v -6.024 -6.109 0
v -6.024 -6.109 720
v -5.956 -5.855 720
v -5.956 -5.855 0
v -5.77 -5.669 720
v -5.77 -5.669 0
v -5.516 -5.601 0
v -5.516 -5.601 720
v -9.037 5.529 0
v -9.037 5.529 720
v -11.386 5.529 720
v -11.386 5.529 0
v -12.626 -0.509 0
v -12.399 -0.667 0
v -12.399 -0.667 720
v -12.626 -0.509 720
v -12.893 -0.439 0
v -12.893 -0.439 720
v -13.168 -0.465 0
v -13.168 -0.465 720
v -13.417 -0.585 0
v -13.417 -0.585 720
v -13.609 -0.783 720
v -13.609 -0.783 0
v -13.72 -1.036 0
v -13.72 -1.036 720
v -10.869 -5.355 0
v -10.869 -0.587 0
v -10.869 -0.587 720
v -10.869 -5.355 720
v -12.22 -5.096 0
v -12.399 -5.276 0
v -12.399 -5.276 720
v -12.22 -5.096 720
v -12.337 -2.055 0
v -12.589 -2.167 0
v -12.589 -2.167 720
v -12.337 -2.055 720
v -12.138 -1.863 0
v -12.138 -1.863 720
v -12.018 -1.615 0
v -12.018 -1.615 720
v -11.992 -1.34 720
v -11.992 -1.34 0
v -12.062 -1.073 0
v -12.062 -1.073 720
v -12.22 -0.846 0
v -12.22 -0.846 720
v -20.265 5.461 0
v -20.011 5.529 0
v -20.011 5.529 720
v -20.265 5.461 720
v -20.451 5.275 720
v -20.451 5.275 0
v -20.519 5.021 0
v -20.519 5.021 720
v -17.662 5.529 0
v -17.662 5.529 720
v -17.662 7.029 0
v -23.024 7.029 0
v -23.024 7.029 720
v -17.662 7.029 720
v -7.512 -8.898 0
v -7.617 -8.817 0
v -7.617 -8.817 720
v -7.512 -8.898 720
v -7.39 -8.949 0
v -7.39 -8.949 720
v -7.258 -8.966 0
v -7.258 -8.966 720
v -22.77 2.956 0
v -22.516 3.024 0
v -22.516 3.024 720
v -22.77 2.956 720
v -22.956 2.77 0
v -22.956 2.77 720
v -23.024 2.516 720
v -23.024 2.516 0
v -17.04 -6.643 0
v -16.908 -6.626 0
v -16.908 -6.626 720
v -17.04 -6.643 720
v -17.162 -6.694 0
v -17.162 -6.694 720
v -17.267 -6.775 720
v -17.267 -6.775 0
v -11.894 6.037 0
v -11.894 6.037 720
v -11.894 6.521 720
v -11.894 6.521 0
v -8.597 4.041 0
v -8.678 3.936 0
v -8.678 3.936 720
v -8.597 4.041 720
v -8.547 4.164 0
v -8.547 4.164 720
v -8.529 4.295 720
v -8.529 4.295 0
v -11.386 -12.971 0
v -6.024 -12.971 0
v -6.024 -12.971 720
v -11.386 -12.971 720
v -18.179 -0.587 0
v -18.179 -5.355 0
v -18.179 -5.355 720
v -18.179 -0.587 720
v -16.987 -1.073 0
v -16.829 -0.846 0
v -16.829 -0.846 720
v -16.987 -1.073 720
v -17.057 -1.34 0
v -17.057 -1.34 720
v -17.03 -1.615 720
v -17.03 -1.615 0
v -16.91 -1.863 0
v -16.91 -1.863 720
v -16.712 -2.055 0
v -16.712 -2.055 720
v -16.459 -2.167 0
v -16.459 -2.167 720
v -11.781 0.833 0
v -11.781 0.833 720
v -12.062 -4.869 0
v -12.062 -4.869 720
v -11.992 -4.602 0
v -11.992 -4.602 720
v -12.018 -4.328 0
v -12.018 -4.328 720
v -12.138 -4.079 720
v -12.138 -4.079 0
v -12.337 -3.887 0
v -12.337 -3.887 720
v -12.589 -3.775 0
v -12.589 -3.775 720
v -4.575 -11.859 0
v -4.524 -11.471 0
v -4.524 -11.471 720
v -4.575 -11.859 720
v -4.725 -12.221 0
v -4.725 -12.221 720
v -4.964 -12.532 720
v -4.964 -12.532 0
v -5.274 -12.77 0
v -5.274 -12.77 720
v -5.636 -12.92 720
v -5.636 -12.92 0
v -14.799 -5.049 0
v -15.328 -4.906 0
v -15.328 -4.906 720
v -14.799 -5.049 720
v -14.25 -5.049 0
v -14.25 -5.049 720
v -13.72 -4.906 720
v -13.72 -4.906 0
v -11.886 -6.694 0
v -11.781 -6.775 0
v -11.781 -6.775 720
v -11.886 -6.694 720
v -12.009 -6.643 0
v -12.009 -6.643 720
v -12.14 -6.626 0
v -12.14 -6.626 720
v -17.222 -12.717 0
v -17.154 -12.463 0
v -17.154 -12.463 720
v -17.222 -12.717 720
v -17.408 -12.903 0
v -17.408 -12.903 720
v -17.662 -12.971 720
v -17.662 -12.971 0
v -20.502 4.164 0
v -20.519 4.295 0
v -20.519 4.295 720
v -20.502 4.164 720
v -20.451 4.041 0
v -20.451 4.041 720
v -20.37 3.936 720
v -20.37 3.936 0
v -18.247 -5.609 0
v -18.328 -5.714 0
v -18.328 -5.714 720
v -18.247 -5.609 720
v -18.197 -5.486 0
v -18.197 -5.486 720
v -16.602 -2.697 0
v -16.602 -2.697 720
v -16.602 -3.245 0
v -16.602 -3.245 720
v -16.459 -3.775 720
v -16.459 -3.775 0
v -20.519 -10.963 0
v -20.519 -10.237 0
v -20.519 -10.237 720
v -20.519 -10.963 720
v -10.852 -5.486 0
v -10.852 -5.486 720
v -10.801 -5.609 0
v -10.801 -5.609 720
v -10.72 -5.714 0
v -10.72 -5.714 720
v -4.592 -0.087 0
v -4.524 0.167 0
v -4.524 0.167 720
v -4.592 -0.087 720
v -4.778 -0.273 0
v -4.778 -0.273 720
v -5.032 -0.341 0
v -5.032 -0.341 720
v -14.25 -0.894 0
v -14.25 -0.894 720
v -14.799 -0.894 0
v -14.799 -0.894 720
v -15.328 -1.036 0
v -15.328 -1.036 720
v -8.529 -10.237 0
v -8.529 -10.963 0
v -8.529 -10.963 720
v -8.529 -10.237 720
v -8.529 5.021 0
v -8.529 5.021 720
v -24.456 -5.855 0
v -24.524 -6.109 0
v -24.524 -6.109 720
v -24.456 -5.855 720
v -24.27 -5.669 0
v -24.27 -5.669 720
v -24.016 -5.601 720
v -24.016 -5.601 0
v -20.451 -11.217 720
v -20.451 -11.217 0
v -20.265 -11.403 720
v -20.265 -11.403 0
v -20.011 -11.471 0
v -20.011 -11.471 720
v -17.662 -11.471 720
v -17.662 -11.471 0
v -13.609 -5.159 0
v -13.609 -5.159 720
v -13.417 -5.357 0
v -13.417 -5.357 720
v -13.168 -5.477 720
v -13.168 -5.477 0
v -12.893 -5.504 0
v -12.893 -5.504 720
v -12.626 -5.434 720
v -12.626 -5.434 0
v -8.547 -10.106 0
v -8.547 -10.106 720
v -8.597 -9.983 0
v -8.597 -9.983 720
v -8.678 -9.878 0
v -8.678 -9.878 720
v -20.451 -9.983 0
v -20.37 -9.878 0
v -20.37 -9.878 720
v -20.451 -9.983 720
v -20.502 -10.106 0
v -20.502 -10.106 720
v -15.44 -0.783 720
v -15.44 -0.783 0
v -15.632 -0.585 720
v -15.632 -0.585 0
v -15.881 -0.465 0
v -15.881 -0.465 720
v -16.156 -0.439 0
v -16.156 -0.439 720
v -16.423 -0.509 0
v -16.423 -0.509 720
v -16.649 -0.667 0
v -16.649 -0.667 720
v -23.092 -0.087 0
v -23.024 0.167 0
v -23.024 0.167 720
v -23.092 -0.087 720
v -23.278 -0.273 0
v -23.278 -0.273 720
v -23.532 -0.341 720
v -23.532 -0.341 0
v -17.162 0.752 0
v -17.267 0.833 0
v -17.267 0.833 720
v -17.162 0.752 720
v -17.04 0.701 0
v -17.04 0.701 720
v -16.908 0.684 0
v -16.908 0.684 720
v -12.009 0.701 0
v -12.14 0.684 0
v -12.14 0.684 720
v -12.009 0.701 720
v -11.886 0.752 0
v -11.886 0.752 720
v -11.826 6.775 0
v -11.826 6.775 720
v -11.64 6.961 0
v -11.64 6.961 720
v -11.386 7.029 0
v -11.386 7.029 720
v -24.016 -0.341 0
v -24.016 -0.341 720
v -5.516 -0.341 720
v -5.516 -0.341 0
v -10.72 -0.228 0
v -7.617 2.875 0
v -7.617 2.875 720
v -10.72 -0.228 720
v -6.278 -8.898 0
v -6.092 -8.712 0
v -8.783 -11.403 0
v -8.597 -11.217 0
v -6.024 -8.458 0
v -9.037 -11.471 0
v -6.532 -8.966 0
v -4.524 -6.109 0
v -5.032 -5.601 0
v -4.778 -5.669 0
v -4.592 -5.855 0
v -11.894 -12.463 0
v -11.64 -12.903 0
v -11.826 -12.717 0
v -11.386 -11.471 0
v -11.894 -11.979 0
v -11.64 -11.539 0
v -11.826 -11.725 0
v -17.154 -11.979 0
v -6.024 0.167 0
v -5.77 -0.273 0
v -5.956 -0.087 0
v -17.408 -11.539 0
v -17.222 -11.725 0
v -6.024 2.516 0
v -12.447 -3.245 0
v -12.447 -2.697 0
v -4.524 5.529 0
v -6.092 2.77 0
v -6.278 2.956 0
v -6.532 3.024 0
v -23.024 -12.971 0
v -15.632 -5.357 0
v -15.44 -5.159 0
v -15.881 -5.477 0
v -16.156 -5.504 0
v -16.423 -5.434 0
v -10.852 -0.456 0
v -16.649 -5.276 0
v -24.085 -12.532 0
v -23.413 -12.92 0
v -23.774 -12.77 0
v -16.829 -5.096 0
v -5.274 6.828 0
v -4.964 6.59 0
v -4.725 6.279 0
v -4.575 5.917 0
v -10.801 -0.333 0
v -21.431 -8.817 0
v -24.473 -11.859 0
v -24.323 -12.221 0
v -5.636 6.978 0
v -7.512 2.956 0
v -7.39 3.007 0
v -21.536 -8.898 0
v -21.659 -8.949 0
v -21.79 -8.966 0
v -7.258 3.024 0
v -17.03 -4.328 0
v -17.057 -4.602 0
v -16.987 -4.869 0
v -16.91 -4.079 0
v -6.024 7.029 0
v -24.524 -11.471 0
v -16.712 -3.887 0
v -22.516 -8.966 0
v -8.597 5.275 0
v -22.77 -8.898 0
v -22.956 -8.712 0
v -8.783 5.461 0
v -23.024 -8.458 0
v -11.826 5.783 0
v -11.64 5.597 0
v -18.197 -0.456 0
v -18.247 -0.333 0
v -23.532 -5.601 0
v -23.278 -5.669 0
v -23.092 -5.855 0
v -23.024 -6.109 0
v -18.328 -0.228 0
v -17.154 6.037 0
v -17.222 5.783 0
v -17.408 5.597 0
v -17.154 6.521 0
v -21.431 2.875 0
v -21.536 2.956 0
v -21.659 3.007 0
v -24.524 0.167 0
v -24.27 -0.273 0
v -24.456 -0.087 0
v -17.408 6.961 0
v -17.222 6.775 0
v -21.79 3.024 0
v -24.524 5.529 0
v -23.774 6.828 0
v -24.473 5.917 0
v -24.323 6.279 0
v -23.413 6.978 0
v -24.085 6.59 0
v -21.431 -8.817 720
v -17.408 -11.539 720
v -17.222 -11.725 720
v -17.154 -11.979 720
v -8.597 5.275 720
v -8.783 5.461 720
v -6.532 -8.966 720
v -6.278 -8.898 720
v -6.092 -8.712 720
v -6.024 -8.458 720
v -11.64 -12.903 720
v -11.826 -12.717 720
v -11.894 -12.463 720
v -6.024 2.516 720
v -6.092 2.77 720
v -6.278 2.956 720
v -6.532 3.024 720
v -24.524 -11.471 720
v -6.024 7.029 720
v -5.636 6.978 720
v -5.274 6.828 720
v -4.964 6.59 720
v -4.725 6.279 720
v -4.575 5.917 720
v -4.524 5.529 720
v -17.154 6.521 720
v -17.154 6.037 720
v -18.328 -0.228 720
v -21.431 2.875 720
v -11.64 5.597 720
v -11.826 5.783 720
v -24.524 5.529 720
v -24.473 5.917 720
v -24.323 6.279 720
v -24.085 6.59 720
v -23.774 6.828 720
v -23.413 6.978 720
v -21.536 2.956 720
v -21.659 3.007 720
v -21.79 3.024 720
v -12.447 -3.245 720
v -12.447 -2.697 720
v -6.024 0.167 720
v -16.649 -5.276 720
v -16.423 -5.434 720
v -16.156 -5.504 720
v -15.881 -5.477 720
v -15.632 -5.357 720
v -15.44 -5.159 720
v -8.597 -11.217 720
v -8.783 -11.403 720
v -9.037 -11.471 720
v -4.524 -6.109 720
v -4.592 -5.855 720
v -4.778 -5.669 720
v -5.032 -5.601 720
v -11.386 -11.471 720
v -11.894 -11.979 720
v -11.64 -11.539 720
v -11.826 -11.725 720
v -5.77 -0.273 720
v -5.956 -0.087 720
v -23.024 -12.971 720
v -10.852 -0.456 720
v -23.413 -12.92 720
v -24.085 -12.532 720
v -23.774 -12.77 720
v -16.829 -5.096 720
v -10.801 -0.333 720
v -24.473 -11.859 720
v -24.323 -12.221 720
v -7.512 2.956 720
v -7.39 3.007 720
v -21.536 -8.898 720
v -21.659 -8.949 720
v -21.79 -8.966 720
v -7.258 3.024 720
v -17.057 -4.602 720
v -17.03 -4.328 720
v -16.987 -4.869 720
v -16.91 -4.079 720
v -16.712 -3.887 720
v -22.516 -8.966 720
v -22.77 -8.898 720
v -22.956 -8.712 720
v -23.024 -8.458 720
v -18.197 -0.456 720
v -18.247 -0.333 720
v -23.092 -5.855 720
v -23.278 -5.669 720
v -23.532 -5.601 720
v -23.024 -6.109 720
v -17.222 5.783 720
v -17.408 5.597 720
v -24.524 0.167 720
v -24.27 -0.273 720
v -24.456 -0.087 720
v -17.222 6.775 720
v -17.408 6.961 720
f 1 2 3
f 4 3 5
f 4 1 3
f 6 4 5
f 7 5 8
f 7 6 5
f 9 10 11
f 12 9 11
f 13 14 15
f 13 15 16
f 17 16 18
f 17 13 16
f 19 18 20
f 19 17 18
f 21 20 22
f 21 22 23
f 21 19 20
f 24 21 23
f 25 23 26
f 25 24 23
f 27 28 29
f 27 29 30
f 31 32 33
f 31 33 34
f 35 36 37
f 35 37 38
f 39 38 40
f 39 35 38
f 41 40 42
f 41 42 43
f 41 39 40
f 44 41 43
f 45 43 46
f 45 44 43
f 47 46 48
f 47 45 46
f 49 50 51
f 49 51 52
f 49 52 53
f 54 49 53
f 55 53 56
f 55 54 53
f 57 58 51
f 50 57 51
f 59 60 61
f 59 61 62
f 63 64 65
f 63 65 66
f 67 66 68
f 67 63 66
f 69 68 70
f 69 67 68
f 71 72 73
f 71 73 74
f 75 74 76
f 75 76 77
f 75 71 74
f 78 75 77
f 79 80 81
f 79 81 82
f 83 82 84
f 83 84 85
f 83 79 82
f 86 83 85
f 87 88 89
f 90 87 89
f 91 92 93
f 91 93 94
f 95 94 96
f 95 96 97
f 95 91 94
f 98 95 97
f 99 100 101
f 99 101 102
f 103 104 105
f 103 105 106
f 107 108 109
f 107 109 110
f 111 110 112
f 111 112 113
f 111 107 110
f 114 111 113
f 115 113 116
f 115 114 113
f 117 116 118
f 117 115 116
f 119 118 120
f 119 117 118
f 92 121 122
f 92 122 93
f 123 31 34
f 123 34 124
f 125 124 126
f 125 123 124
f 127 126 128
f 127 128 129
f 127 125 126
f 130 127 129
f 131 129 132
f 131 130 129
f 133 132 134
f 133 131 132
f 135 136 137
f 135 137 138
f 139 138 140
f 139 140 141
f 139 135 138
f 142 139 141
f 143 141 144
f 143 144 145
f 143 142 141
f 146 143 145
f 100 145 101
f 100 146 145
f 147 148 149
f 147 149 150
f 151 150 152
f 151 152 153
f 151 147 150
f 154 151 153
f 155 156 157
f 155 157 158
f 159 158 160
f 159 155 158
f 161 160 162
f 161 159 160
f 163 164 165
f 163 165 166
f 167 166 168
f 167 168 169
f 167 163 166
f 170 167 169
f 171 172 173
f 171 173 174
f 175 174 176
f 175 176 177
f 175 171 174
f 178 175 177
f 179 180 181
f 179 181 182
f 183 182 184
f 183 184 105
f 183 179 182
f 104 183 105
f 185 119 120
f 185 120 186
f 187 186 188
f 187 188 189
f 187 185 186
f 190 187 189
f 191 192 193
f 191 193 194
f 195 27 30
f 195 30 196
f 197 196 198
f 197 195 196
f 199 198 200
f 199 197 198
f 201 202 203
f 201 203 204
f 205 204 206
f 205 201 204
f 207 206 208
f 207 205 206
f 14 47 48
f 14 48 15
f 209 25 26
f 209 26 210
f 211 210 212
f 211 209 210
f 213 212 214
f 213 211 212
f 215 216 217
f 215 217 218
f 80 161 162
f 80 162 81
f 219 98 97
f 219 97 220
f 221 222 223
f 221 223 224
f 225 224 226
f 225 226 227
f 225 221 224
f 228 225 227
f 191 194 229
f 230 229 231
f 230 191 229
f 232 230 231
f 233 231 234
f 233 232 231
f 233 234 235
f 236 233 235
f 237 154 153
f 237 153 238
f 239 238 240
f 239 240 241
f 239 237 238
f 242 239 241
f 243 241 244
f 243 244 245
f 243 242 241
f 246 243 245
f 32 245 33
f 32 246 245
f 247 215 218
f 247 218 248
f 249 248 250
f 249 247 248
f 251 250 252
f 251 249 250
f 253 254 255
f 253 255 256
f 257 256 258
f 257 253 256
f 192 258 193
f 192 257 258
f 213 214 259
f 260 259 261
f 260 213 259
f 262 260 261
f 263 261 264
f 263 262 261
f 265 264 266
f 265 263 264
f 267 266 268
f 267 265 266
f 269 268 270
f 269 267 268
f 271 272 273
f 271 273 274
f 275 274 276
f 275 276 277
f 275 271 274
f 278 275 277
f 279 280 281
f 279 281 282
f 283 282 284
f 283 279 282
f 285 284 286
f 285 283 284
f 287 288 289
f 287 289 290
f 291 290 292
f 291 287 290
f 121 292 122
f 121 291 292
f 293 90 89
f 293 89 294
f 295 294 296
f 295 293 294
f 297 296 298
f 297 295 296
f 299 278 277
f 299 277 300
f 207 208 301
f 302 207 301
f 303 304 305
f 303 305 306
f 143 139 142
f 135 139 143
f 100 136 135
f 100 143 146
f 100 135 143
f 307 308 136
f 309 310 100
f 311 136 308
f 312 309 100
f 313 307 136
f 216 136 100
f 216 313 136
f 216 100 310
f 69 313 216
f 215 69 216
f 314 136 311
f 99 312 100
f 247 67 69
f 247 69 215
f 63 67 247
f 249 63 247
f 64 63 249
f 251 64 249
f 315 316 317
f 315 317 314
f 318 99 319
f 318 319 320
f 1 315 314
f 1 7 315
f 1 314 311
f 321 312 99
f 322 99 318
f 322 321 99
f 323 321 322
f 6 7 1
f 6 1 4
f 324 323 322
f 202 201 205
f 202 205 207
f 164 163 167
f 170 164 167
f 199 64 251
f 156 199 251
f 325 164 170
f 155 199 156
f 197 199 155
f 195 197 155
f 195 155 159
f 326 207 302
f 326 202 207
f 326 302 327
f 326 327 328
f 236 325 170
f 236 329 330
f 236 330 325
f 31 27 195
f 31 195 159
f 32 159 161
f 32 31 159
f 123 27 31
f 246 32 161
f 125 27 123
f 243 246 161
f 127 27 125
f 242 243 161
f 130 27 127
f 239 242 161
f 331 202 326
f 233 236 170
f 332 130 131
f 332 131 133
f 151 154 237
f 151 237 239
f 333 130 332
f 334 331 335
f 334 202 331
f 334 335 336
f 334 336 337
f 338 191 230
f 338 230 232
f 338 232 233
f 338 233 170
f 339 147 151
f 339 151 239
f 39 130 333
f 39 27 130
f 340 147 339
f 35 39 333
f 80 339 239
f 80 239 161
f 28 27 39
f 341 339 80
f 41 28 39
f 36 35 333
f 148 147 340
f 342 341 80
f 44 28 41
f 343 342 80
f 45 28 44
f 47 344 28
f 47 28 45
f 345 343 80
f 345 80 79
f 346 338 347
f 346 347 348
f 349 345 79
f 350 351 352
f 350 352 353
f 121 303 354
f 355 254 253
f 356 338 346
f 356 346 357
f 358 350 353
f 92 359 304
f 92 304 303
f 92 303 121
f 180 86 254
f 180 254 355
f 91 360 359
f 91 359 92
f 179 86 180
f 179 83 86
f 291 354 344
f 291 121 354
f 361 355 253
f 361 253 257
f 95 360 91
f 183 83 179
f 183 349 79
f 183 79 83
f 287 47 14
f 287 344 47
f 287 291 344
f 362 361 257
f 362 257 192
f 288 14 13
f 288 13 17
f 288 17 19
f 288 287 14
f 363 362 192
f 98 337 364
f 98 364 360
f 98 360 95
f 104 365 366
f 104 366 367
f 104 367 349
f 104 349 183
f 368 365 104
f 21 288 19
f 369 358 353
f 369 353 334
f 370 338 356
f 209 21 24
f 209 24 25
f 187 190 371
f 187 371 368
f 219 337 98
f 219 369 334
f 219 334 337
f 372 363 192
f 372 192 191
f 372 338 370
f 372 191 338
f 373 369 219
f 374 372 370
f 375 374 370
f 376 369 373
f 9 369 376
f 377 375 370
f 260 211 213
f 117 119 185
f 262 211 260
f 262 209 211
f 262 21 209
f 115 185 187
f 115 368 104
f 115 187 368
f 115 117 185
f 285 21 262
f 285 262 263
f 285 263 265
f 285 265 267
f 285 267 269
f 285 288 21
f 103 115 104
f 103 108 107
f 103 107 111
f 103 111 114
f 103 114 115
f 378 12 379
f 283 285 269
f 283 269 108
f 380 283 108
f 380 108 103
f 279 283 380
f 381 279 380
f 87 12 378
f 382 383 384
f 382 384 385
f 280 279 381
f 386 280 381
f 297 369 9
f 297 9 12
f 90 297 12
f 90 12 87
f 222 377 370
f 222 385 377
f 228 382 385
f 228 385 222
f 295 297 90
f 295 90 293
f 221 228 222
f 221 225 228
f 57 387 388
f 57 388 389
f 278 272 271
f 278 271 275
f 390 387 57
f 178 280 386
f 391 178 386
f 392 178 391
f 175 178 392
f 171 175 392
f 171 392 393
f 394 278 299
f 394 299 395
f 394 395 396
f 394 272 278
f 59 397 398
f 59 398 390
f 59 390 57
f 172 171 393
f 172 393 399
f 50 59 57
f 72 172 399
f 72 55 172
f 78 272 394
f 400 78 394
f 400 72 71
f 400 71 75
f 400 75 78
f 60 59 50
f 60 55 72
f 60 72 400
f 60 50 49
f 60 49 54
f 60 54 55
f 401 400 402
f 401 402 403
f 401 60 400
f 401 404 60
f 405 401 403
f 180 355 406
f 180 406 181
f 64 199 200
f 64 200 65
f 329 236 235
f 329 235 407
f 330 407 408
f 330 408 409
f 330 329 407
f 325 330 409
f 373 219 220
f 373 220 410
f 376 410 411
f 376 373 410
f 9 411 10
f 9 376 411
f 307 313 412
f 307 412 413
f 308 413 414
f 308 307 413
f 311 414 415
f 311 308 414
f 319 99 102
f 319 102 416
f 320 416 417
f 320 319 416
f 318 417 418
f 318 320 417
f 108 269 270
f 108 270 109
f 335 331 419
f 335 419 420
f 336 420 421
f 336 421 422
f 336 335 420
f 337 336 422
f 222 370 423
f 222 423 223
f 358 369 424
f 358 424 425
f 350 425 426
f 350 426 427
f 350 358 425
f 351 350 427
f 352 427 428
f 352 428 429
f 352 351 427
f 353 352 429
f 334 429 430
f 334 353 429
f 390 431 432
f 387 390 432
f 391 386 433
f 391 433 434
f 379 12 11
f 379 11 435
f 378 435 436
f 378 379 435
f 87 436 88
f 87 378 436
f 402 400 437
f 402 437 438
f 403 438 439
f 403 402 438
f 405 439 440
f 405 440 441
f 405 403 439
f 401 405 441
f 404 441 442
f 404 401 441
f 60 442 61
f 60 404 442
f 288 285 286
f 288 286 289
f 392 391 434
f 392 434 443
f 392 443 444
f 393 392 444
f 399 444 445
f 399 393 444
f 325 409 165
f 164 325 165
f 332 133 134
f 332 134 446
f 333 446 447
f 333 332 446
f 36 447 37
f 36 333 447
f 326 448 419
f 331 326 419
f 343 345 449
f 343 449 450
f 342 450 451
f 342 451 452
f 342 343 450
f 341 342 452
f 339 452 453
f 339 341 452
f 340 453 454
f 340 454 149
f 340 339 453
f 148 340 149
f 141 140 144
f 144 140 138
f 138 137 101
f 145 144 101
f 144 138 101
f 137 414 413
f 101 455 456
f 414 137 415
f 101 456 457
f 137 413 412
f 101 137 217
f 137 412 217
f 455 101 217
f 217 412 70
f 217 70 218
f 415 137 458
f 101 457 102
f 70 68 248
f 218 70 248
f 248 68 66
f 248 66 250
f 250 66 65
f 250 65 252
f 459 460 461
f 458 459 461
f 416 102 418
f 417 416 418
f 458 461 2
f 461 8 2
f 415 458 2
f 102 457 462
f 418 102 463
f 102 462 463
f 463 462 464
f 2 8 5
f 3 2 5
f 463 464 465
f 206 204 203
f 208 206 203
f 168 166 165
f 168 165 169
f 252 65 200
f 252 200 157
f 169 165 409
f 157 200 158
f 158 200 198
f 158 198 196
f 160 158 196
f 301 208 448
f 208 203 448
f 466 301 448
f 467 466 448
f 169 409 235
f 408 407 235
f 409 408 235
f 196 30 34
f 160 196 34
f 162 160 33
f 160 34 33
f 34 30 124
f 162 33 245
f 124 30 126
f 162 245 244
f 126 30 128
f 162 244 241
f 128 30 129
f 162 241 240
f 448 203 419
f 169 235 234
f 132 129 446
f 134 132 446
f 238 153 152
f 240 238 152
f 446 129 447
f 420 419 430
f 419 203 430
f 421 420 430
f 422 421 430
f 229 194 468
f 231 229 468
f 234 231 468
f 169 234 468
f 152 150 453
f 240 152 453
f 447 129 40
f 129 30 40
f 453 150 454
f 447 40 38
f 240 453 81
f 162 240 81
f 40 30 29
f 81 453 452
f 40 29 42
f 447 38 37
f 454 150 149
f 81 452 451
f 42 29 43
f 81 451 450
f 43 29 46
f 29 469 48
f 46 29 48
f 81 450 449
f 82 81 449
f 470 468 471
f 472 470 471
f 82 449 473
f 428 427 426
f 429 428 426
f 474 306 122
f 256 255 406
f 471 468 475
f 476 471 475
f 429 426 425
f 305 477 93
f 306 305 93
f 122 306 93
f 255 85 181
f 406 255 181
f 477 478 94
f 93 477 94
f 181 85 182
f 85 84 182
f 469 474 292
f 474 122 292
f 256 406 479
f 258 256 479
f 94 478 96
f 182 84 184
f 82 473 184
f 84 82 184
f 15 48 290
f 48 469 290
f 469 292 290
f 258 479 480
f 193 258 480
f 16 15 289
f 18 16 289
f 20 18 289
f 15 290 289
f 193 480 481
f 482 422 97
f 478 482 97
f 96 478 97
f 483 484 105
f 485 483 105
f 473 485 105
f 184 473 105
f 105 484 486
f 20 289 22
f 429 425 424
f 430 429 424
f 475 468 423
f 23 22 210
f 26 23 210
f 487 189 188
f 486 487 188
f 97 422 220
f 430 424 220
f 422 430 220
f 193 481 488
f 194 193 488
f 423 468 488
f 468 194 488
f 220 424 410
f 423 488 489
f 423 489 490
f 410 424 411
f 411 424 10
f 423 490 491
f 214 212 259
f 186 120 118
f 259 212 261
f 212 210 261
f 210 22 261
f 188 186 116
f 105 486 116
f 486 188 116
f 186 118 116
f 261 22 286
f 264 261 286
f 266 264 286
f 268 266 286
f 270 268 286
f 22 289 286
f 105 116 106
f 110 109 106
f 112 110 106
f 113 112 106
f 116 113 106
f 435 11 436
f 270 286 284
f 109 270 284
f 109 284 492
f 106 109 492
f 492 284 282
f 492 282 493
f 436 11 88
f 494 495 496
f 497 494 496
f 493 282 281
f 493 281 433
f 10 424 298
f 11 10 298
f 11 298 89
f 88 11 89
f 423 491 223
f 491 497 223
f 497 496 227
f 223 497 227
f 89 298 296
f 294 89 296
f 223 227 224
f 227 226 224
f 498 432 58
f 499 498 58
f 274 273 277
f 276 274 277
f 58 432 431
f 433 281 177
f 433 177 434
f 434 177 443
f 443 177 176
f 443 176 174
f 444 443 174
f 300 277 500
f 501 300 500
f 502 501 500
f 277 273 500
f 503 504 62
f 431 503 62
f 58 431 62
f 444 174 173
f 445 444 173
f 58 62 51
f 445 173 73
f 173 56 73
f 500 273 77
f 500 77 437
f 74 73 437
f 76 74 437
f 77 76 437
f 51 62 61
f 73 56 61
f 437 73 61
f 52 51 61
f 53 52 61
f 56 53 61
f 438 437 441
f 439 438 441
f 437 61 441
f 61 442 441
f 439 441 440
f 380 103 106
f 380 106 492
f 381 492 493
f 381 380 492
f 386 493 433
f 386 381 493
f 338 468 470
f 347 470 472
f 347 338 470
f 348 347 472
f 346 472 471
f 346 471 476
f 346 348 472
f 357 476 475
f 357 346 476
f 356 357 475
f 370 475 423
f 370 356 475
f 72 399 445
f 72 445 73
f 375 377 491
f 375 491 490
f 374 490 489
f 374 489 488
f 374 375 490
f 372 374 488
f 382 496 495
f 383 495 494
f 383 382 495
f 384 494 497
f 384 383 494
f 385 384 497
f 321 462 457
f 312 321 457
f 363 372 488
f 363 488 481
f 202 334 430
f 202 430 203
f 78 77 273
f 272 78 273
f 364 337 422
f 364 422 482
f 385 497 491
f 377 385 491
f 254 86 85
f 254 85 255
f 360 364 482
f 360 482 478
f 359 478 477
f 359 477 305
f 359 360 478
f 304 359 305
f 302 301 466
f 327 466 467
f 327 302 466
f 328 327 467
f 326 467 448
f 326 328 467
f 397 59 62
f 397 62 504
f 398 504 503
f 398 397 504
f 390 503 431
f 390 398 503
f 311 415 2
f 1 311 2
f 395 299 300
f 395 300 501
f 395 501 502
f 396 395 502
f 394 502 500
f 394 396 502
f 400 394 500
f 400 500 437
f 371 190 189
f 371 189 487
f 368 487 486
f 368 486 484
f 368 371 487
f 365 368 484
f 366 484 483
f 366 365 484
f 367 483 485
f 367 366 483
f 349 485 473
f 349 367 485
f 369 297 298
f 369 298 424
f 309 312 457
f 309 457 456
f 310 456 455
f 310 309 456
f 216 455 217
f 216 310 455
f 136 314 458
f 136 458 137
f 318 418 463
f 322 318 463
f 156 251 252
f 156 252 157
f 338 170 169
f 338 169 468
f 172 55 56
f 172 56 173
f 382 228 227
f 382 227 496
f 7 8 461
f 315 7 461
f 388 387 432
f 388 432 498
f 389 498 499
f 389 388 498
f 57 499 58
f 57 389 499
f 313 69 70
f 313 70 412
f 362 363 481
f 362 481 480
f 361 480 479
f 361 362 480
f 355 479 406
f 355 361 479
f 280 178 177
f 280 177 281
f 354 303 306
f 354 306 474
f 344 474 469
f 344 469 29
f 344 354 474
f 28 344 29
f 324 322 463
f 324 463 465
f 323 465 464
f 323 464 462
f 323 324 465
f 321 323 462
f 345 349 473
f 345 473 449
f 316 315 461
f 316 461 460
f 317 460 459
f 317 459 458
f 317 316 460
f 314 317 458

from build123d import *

# Parameters (mm, degrees)
EXTRUDE1_DEPTH = 720


with BuildPart() as part:
    # Sketch1 → Extrude1 (new body)
    with BuildSketch(Plane.XY):
        with BuildLine():
            Line((-5.032287798, -0.341059771), (-5.516287798, -0.341059771))
            ThreePointArc((-5.516287798, -0.341059771), (-5.875498042, -0.192270016), (-6.024287798, 0.166940229))
            Line((-6.024287798, 0.166940229), (-6.024287798, 2.515940229))
            ThreePointArc((-6.024287798, 2.515940229), (-6.173077553, 2.875150474), (-6.532287798, 3.023940229))
            Line((-6.532287798, 3.023940229), (-7.258207136, 3.023940229))
            ThreePointArc((-7.258207136, 3.023940229), (-7.45261032, 2.985271032), (-7.617417381, 2.875150474))
            Line((-7.617417381, 2.875150474), (-10.720498042, -0.227930187))
            ThreePointArc((-10.720498042, -0.227930187), (-10.8306186, -0.392737249), (-10.869287798, -0.587140432))
            Line((-10.869287798, -0.587140432), (-10.869287798, -5.354979109))
            ThreePointArc((-10.869287798, -5.354979109), (-10.8306186, -5.549382293), (-10.720498042, -5.714189354))
            Line((-10.720498042, -5.714189354), (-7.617417381, -8.817270016))
            ThreePointArc((-7.617417381, -8.817270016), (-7.45261032, -8.927390573), (-7.258207136, -8.966059771))
            Line((-7.258207136, -8.966059771), (-6.532287798, -8.966059771))
            ThreePointArc((-6.532287798, -8.966059771), (-6.173077553, -8.817270016), (-6.024287798, -8.458059771))
            Line((-6.024287798, -8.458059771), (-6.024287798, -6.109059771))
            ThreePointArc((-6.024287798, -6.109059771), (-5.875498042, -5.749849526), (-5.516287798, -5.601059771))
            Line((-5.516287798, -5.601059771), (-5.032287798, -5.601059771))
            ThreePointArc((-5.032287798, -5.601059771), (-4.673077553, -5.749849526), (-4.524287798, -6.109059771))
            Line((-4.524287798, -6.109059771), (-4.524287798, -11.471059771))
            ThreePointArc((-4.524287798, -11.471059771), (-4.963627626, -12.531719943), (-6.024287798, -12.971059771))
            Line((-6.024287798, -12.971059771), (-11.386287798, -12.971059771))
            ThreePointArc((-11.386287798, -12.971059771), (-11.745498042, -12.822270016), (-11.894287798, -12.463059771))
            Line((-11.894287798, -12.463059771), (-11.894287798, -11.979059771))
            ThreePointArc((-11.894287798, -11.979059771), (-11.745498042, -11.619849526), (-11.386287798, -11.471059771))
            Line((-11.386287798, -11.471059771), (-9.037287798, -11.471059771))
            ThreePointArc((-9.037287798, -11.471059771), (-8.678077553, -11.322270016), (-8.529287798, -10.963059771))
            Line((-8.529287798, -10.963059771), (-8.529287798, -10.237140432))
            ThreePointArc((-8.529287798, -10.237140432), (-8.567956995, -10.042737249), (-8.678077553, -9.877930187))
            Line((-8.678077553, -9.877930187), (-11.781158214, -6.774849526))
            ThreePointArc((-11.781158214, -6.774849526), (-11.945965275, -6.664728968), (-12.140368459, -6.626059771))
            Line((-12.140368459, -6.626059771), (-16.908207136, -6.626059771))
            ThreePointArc((-16.908207136, -6.626059771), (-17.10261032, -6.664728968), (-17.267417381, -6.774849526))
            Line((-17.267417381, -6.774849526), (-20.370498042, -9.877930187))
            ThreePointArc((-20.370498042, -9.877930187), (-20.4806186, -10.042737249), (-20.519287798, -10.237140432))
            Line((-20.519287798, -10.237140432), (-20.519287798, -10.963059771))
            ThreePointArc((-20.519287798, -10.963059771), (-20.370498042, -11.322270016), (-20.011287798, -11.471059771))
            Line((-20.011287798, -11.471059771), (-17.662287798, -11.471059771))
            ThreePointArc((-17.662287798, -11.471059771), (-17.303077553, -11.619849526), (-17.154287798, -11.979059771))
            Line((-17.154287798, -11.979059771), (-17.154287798, -12.463059771))
            ThreePointArc((-17.154287798, -12.463059771), (-17.303077553, -12.822270016), (-17.662287798, -12.971059771))
            Line((-17.662287798, -12.971059771), (-23.024287798, -12.971059771))
            ThreePointArc((-23.024287798, -12.971059771), (-24.084947969, -12.531719943), (-24.524287798, -11.471059771))
            Line((-24.524287798, -11.471059771), (-24.524287798, -6.109059771))
            ThreePointArc((-24.524287798, -6.109059771), (-24.375498042, -5.749849526), (-24.016287798, -5.601059771))
            Line((-24.016287798, -5.601059771), (-23.532287798, -5.601059771))
            ThreePointArc((-23.532287798, -5.601059771), (-23.173077553, -5.749849526), (-23.024287798, -6.109059771))
            Line((-23.024287798, -6.109059771), (-23.024287798, -8.458059771))
            ThreePointArc((-23.024287798, -8.458059771), (-22.875498042, -8.817270016), (-22.516287798, -8.966059771))
            Line((-22.516287798, -8.966059771), (-21.790368459, -8.966059771))
            ThreePointArc((-21.790368459, -8.966059771), (-21.595965275, -8.927390573), (-21.431158214, -8.817270016))
            Line((-21.431158214, -8.817270016), (-18.328077553, -5.714189354))
            ThreePointArc((-18.328077553, -5.714189354), (-18.217956995, -5.549382293), (-18.179287798, -5.354979109))
            Line((-18.179287798, -5.354979109), (-18.179287798, -0.587140432))
            ThreePointArc((-18.179287798, -0.587140432), (-18.217956995, -0.392737249), (-18.328077553, -0.227930187))
            Line((-18.328077553, -0.227930187), (-21.431158214, 2.875150474))
            ThreePointArc((-21.431158214, 2.875150474), (-21.595965275, 2.985271032), (-21.790368459, 3.023940229))
            Line((-21.790368459, 3.023940229), (-22.516287798, 3.023940229))
            ThreePointArc((-22.516287798, 3.023940229), (-22.875498042, 2.875150474), (-23.024287798, 2.515940229))
            Line((-23.024287798, 2.515940229), (-23.024287798, 0.166940229))
            ThreePointArc((-23.024287798, 0.166940229), (-23.173077553, -0.192270016), (-23.532287798, -0.341059771))
            Line((-23.532287798, -0.341059771), (-24.016287798, -0.341059771))
            ThreePointArc((-24.016287798, -0.341059771), (-24.375498042, -0.192270016), (-24.524287798, 0.166940229))
            Line((-24.524287798, 0.166940229), (-24.524287798, 5.528940229))
            ThreePointArc((-24.524287798, 5.528940229), (-24.084947969, 6.589600401), (-23.024287798, 7.028940229))
            Line((-23.024287798, 7.028940229), (-17.662287798, 7.028940229))
            ThreePointArc((-17.662287798, 7.028940229), (-17.303077553, 6.880150474), (-17.154287798, 6.520940229))
            Line((-17.154287798, 6.520940229), (-17.154287798, 6.036940229))
            ThreePointArc((-17.154287798, 6.036940229), (-17.303077553, 5.677729984), (-17.662287798, 5.528940229))
            Line((-17.662287798, 5.528940229), (-20.011287798, 5.528940229))
            ThreePointArc((-20.011287798, 5.528940229), (-20.370498042, 5.380150474), (-20.519287798, 5.020940229))
            Line((-20.519287798, 5.020940229), (-20.519287798, 4.295020891))
            ThreePointArc((-20.519287798, 4.295020891), (-20.4806186, 4.100617707), (-20.370498042, 3.935810646))
            Line((-20.370498042, 3.935810646), (-17.267417381, 0.832729984))
            ThreePointArc((-17.267417381, 0.832729984), (-17.10261032, 0.722609427), (-16.908207136, 0.683940229))
            Line((-16.908207136, 0.683940229), (-12.140368459, 0.683940229))
            ThreePointArc((-12.140368459, 0.683940229), (-11.945965275, 0.722609427), (-11.781158214, 0.832729984))
            Line((-11.781158214, 0.832729984), (-8.678077553, 3.935810646))
            ThreePointArc((-8.678077553, 3.935810646), (-8.567956995, 4.100617707), (-8.529287798, 4.295020891))
            Line((-8.529287798, 4.295020891), (-8.529287798, 5.020940229))
            ThreePointArc((-8.529287798, 5.020940229), (-8.678077553, 5.380150474), (-9.037287798, 5.528940229))
            Line((-9.037287798, 5.528940229), (-11.386287798, 5.528940229))
            ThreePointArc((-11.386287798, 5.528940229), (-11.745498042, 5.677729984), (-11.894287798, 6.036940229))
            Line((-11.894287798, 6.036940229), (-11.894287798, 6.520940229))
            ThreePointArc((-11.894287798, 6.520940229), (-11.745498042, 6.880150474), (-11.386287798, 7.028940229))
            Line((-11.386287798, 7.028940229), (-6.024287798, 7.028940229))
            ThreePointArc((-6.024287798, 7.028940229), (-4.963627626, 6.589600401), (-4.524287798, 5.528940229))
            Line((-4.524287798, 5.528940229), (-4.524287798, 0.166940229))
            ThreePointArc((-4.524287798, 0.166940229), (-4.673077553, -0.192270016), (-5.032287798, -0.341059771))
        make_face()
        with BuildLine():
            Line((-12.399386954, -5.275565737), (-12.219781831, -5.095960615))
            ThreePointArc((-12.219781831, -5.095960615), (-12.018349781, -4.327527582), (-12.589154291, -3.775036489))
            ThreePointArc((-12.589154291, -3.775036489), (-12.428787798, -2.971059771), (-12.589154291, -2.167083053))
            ThreePointArc((-12.589154291, -2.167083053), (-12.018349781, -1.61459196), (-12.219781831, -0.846158927))
            Line((-12.219781831, -0.846158927), (-12.399386954, -0.666553805))
            ThreePointArc((-12.399386954, -0.666553805), (-13.167819987, -0.465121754), (-13.72031108, -1.035926265))
            ThreePointArc((-13.72031108, -1.035926265), (-14.524287798, -0.875559771), (-15.328264516, -1.035926265))
            ThreePointArc((-15.328264516, -1.035926265), (-15.880755608, -0.465121754), (-16.649188641, -0.666553805))
            Line((-16.649188641, -0.666553805), (-16.828793764, -0.846158927))
            ThreePointArc((-16.828793764, -0.846158927), (-17.030225814, -1.61459196), (-16.459421304, -2.167083053))
            ThreePointArc((-16.459421304, -2.167083053), (-16.619787798, -2.971059771), (-16.459421304, -3.775036489))
            ThreePointArc((-16.459421304, -3.775036489), (-17.030225814, -4.327527582), (-16.828793764, -5.095960615))
            Line((-16.828793764, -5.095960615), (-16.649188641, -5.275565737))
            ThreePointArc((-16.649188641, -5.275565737), (-15.880755608, -5.476997788), (-15.328264516, -4.906193277))
            ThreePointArc((-15.328264516, -4.906193277), (-14.524287798, -5.066559771), (-13.72031108, -4.906193277))
            ThreePointArc((-13.72031108, -4.906193277), (-13.167819987, -5.476997788), (-12.399386954, -5.275565737))
        make_face(mode=Mode.SUBTRACT)
    extrude(amount=EXTRUDE1_DEPTH)


solid = part.part
